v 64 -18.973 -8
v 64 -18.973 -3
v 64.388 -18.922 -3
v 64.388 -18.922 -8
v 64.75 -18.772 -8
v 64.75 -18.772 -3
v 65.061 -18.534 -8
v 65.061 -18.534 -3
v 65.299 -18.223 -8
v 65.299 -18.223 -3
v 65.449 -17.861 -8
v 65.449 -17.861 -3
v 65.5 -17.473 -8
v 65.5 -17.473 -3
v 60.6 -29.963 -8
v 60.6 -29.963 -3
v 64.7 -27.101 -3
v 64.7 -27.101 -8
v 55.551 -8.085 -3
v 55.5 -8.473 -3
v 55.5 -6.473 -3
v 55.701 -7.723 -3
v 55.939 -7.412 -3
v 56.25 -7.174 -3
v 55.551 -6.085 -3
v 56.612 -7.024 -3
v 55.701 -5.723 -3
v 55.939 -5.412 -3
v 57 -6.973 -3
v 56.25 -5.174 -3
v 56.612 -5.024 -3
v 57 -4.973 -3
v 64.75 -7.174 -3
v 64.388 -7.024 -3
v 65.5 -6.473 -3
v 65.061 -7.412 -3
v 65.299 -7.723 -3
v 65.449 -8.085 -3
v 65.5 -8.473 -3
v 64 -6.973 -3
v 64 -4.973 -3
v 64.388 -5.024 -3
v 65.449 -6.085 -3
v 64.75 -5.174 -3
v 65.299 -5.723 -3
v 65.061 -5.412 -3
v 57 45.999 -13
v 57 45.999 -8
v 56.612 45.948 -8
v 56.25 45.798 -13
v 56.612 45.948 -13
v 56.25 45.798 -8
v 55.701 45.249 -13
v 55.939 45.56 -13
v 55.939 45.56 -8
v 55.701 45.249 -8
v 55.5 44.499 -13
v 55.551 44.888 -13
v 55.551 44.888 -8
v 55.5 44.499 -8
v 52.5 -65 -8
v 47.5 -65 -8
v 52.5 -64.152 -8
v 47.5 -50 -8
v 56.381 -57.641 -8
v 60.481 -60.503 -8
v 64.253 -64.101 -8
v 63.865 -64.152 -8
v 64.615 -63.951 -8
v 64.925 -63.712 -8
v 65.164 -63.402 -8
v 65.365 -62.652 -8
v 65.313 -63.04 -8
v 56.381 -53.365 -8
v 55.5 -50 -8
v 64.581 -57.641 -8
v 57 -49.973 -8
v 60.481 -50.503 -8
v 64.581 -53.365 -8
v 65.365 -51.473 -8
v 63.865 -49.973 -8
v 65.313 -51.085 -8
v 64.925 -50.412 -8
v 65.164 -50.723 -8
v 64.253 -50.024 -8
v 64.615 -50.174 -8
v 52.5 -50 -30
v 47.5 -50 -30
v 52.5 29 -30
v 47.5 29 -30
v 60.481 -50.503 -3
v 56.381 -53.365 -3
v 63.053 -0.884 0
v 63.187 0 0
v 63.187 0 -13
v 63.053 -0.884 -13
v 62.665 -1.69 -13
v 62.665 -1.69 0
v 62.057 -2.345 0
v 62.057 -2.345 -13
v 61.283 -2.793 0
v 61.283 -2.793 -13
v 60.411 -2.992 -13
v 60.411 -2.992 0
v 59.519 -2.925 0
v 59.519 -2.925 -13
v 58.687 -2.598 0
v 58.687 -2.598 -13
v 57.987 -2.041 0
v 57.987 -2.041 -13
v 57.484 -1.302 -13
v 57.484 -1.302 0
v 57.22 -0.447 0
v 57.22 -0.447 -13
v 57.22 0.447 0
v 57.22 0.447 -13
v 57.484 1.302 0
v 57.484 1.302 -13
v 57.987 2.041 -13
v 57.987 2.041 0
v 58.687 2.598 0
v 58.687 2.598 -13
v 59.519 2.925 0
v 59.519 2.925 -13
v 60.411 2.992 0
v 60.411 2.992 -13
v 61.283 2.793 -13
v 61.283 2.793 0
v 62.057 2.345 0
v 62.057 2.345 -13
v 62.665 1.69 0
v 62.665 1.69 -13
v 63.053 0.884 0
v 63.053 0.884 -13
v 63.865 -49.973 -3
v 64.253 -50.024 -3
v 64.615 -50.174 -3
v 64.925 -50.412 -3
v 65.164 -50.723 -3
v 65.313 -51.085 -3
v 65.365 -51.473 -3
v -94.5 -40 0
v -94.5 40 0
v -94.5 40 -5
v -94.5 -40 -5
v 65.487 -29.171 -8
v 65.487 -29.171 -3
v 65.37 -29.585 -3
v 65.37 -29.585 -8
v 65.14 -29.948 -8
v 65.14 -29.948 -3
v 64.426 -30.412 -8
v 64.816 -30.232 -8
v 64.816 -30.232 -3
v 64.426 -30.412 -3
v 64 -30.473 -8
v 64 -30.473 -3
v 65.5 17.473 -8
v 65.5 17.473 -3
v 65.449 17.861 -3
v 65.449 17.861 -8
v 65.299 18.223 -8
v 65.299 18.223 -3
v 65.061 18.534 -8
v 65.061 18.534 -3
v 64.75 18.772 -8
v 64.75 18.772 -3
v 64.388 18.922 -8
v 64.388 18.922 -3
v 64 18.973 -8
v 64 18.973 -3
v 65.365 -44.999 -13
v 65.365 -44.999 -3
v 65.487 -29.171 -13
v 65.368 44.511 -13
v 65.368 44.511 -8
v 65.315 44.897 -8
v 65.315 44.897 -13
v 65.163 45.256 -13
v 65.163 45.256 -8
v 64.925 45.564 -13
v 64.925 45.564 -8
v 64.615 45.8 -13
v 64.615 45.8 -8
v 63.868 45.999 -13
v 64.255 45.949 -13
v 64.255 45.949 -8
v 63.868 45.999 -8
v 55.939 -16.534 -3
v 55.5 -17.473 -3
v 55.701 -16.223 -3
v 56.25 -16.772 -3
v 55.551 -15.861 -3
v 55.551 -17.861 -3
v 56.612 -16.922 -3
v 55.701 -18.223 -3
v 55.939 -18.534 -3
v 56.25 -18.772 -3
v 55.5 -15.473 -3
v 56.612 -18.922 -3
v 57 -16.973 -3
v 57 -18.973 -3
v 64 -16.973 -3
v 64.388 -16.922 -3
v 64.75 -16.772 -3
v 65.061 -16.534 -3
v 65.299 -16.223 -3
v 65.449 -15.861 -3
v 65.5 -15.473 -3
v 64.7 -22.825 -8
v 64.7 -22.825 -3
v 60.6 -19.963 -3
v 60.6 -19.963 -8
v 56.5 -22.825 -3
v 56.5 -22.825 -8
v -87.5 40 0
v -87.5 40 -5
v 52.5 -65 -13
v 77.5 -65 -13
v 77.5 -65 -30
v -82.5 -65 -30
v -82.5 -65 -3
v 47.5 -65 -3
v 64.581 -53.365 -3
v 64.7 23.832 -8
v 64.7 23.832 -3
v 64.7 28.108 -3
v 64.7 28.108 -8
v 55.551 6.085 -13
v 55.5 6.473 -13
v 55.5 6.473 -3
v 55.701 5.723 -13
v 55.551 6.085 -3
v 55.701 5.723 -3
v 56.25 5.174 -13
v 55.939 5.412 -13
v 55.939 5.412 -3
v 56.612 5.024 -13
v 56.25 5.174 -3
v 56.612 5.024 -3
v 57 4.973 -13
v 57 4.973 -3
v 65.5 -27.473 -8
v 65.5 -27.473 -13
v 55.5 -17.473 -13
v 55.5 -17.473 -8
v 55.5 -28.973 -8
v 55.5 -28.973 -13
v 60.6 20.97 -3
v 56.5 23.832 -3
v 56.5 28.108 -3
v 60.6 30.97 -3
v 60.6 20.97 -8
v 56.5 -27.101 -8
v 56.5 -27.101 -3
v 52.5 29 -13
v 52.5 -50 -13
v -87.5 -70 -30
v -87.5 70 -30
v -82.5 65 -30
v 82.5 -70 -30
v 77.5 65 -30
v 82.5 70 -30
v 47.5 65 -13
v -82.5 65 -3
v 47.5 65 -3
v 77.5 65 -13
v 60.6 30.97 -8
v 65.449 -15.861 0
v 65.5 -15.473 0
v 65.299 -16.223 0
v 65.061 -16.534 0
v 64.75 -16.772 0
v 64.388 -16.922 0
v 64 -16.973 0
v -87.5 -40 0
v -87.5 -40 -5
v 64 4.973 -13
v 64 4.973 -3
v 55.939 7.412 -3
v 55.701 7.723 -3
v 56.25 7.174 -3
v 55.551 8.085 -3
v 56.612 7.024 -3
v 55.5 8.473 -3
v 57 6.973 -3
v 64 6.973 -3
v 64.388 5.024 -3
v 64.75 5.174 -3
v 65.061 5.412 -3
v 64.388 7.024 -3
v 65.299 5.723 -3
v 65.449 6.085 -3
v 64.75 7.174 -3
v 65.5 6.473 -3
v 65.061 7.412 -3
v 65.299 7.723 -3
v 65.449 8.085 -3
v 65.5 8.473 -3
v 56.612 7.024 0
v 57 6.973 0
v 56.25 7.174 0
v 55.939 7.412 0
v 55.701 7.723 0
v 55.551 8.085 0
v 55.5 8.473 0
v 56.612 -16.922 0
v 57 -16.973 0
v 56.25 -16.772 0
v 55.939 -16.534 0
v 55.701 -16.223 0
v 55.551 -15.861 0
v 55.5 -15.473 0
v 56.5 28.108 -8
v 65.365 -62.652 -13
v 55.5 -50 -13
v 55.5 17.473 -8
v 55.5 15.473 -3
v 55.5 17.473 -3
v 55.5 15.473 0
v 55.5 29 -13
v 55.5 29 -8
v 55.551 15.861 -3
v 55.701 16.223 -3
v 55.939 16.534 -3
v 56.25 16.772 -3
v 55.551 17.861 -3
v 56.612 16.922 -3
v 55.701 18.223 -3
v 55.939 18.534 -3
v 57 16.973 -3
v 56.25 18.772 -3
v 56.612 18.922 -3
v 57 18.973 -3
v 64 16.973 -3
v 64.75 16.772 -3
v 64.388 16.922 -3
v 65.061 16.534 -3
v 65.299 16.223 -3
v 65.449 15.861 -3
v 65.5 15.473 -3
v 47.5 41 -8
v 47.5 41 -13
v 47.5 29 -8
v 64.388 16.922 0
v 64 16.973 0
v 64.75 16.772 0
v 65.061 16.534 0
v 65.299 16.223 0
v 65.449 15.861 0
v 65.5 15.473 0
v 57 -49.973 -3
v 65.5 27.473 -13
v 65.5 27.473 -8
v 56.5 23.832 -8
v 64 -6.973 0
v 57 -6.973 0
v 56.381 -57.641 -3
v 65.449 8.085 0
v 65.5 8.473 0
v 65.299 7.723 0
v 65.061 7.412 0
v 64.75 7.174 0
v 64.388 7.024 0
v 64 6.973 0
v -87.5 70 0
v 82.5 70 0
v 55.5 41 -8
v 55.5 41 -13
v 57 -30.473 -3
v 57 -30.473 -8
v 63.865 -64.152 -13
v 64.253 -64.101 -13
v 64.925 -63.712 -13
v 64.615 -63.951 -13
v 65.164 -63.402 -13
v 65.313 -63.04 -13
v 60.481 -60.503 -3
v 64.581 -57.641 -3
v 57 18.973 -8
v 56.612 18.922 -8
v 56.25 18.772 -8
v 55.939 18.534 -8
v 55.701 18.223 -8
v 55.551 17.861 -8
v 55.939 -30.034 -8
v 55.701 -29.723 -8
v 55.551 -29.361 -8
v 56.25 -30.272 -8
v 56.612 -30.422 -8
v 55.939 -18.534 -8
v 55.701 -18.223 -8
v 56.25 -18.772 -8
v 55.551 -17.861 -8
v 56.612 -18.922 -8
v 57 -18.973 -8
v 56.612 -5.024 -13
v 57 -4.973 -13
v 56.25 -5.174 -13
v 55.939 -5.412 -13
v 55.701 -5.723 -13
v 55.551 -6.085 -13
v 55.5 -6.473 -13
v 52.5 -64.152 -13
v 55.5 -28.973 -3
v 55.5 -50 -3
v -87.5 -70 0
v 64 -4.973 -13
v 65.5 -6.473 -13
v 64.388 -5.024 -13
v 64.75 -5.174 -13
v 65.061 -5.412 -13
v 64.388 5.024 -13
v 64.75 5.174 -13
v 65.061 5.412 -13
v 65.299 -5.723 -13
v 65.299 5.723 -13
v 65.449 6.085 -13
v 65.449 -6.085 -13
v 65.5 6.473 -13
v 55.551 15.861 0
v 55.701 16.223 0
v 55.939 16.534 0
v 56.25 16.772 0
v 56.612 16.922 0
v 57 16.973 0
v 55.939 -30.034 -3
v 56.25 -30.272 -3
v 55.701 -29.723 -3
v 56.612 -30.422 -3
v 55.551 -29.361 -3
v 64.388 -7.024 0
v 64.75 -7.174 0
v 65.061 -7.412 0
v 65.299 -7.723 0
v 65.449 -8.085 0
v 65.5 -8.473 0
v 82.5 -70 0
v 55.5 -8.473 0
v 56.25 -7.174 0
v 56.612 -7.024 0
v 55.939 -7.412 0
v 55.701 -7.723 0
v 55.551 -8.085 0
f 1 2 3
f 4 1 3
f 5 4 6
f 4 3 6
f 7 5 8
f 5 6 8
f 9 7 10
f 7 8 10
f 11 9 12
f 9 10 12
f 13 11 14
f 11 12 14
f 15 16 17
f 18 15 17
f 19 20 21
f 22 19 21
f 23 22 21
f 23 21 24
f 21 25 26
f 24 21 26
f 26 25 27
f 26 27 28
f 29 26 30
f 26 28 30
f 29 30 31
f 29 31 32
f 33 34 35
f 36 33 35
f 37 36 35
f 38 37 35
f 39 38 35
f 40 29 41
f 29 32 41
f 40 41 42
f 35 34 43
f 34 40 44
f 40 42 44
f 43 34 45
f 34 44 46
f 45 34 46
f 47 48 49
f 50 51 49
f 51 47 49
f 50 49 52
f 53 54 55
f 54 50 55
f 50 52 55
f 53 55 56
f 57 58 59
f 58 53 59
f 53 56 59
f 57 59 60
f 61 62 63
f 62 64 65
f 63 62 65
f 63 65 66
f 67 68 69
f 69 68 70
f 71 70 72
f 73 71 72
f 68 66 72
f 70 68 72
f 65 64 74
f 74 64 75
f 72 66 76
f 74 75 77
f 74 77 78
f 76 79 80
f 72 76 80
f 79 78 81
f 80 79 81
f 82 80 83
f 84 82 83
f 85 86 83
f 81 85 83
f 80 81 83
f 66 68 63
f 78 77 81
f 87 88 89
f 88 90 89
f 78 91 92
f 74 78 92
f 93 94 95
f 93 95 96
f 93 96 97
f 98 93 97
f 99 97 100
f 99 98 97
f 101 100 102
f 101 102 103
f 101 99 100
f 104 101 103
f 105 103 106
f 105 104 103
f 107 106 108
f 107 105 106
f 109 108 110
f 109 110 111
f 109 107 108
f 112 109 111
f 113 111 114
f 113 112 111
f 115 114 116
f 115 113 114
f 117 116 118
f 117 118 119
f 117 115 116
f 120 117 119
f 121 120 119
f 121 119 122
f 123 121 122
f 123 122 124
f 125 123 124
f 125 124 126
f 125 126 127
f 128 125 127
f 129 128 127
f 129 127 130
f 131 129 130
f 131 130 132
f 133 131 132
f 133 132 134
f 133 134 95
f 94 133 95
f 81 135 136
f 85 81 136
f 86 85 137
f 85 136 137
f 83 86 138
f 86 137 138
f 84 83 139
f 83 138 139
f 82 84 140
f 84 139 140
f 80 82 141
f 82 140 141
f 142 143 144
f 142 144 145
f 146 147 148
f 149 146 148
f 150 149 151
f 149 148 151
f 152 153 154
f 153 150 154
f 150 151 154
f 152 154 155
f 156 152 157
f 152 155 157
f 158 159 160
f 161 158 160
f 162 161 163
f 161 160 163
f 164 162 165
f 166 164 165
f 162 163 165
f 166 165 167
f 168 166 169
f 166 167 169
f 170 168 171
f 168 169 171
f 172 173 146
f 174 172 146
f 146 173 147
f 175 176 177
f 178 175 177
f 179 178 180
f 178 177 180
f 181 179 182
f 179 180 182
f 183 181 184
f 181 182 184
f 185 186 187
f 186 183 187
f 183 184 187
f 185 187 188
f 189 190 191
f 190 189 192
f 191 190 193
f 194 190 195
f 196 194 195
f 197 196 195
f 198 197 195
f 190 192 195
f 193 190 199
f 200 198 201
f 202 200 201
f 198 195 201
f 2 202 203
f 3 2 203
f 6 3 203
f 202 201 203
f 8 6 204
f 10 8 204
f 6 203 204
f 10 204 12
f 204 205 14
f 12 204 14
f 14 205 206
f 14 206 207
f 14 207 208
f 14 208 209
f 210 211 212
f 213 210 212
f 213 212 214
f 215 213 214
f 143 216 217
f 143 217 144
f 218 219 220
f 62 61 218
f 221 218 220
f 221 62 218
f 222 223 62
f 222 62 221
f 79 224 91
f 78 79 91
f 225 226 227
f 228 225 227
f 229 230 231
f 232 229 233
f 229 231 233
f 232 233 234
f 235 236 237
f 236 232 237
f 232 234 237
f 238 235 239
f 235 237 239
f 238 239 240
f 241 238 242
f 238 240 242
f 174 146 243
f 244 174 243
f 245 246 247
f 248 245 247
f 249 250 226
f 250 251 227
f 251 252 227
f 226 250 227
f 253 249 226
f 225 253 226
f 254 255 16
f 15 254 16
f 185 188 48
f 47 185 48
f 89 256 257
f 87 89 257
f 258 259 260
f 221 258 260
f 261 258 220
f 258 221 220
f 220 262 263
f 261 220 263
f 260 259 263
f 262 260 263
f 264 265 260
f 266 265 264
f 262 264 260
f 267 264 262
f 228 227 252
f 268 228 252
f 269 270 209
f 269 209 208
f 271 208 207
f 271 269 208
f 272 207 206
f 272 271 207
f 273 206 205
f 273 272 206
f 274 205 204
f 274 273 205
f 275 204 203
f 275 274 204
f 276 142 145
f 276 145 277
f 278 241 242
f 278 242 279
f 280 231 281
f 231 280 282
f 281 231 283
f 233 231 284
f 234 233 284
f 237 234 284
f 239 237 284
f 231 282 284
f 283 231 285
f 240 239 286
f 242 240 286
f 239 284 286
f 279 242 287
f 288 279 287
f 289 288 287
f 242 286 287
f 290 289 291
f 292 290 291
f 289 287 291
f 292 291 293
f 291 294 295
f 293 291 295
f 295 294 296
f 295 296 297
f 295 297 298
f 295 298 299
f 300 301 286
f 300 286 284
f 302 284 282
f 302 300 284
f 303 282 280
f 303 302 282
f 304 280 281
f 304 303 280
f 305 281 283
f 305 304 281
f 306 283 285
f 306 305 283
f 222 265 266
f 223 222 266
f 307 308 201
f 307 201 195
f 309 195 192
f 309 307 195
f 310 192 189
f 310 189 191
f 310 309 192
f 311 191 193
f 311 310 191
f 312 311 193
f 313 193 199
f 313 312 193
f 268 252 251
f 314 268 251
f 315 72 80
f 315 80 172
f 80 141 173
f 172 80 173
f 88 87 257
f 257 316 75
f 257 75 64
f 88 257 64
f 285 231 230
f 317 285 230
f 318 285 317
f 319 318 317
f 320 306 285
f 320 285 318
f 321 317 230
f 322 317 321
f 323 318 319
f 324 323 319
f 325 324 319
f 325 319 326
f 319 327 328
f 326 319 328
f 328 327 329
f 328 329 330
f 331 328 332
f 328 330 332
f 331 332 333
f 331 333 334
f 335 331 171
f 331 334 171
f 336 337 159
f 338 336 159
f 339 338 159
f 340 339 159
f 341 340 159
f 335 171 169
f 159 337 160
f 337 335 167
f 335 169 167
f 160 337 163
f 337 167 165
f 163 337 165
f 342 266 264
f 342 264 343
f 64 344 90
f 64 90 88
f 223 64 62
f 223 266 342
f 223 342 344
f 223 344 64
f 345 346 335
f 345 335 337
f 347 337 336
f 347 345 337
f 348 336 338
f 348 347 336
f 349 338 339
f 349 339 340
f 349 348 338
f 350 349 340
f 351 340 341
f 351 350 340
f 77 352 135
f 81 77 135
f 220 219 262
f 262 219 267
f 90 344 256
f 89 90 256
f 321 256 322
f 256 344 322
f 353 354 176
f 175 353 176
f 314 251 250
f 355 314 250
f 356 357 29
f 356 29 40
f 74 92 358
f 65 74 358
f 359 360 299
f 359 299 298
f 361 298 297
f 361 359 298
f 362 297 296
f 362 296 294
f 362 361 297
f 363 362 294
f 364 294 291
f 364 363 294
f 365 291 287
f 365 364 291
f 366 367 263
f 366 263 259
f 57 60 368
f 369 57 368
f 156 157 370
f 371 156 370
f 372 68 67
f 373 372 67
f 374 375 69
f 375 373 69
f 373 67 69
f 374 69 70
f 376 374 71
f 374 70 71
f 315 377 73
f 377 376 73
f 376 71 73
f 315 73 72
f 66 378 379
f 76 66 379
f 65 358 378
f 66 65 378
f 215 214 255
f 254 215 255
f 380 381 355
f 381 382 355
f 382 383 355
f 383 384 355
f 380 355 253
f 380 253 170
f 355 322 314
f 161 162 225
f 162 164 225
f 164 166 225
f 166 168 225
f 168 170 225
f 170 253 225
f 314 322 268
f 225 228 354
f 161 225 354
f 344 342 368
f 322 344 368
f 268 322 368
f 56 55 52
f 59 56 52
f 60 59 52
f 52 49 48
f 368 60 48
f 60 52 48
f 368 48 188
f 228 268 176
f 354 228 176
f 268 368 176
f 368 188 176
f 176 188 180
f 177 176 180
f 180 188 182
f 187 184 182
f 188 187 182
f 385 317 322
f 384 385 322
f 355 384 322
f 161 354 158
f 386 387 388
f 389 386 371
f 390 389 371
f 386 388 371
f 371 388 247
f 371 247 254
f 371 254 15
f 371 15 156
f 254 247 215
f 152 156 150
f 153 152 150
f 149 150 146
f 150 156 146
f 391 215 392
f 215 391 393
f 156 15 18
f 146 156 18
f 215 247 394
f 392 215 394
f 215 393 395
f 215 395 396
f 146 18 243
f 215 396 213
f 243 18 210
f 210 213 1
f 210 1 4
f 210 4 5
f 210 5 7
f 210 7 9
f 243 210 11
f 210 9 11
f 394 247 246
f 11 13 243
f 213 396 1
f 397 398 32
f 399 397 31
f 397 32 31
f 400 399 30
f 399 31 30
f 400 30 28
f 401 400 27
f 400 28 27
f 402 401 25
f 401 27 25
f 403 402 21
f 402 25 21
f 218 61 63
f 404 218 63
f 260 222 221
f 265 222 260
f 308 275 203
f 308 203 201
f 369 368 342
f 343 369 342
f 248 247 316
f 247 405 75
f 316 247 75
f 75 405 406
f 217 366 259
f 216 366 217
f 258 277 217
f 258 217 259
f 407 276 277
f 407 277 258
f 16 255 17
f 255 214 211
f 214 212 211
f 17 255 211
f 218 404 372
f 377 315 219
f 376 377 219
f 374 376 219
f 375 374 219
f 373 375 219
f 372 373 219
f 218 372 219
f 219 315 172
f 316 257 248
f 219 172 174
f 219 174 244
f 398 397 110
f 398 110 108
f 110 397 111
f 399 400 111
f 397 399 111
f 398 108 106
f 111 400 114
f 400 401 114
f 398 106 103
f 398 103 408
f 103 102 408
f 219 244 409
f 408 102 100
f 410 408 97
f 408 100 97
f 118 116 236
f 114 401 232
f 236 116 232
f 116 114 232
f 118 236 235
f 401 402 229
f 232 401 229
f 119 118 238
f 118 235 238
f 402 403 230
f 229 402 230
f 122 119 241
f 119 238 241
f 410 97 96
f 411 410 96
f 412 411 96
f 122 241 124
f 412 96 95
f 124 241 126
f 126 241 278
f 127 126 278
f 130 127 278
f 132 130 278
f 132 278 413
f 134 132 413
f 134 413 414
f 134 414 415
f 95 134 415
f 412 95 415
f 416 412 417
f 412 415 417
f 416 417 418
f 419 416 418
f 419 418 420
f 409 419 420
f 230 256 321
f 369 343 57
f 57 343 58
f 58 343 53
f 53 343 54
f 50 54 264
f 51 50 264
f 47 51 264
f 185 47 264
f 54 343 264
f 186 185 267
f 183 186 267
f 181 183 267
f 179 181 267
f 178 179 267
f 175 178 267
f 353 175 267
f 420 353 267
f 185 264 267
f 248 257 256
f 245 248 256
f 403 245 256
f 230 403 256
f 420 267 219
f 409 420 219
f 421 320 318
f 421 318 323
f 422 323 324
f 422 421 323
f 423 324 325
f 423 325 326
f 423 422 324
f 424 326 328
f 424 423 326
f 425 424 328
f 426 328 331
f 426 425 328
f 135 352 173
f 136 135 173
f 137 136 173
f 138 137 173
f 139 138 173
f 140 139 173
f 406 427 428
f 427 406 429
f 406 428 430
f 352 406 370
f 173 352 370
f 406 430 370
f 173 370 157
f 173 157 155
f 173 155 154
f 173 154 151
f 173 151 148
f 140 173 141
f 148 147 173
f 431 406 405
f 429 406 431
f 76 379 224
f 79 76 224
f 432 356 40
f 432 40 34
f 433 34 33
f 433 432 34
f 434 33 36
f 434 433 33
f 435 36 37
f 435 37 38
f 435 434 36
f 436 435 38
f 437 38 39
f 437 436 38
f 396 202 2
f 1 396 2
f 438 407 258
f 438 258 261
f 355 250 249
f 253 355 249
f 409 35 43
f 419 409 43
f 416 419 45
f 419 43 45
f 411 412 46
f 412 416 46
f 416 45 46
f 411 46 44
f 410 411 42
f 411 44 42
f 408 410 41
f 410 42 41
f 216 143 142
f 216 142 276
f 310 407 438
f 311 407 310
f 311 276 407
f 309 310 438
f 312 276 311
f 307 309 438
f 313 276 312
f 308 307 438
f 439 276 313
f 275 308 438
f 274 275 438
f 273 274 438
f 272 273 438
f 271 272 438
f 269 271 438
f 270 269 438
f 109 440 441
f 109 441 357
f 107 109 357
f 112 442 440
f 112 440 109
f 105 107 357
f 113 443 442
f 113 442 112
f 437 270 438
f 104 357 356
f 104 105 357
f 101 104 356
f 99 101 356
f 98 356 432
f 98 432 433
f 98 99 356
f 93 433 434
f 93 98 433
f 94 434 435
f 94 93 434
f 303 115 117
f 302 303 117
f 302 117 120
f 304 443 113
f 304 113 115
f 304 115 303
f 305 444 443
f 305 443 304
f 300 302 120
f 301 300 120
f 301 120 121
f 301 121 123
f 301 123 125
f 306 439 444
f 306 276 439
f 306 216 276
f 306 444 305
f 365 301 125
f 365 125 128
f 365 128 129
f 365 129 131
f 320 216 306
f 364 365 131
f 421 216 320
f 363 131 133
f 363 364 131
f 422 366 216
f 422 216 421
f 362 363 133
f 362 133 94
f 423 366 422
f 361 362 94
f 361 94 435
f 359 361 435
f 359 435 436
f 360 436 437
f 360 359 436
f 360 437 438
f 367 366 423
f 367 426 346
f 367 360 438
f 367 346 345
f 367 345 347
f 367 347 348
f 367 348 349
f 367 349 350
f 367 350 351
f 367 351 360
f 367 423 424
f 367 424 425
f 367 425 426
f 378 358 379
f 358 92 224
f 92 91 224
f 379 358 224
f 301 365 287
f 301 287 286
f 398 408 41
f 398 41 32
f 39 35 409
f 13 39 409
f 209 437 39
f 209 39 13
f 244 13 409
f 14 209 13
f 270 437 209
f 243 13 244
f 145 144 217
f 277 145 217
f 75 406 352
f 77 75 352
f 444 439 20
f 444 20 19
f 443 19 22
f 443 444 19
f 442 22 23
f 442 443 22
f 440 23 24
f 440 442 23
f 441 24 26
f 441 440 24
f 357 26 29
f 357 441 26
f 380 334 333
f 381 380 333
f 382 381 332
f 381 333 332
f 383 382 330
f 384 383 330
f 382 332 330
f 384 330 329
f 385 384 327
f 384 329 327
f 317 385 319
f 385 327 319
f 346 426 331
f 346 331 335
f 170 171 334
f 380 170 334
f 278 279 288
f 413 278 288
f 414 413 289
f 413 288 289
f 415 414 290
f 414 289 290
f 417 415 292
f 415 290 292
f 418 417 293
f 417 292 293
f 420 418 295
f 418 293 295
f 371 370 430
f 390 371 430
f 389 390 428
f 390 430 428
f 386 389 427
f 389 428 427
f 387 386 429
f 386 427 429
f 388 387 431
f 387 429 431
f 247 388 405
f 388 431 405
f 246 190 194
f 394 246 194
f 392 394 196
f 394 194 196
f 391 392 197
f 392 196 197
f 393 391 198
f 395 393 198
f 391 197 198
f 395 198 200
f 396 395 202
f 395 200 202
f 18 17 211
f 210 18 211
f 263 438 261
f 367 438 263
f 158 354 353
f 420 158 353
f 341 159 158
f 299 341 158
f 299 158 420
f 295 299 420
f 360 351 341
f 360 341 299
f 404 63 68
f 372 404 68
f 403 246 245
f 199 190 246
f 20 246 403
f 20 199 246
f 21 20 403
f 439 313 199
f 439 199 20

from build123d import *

# Parameters (mm, degrees)
F0_W     = 5
F0_H     = 24
F0_H_2   = 12
F0_R     = 2.55
F0_W_2   = 3
F1_DEPTH = 30
F2_START = -13
F2_DEPTH = 17
F3_START = -3
F3_DEPTH = 27
F4_START = -8
F4_DEPTH = 22
F5_DEPTH = 3
F6_DEPTH = 5


# Not quite as in the source:
# - a feature names something its author has since deleted; it is built from what else it names


with BuildPart() as f1:
    # F0 (on Top) → F1 (new body)
    with BuildSketch(Plane.XY):
        Polygon((82.5, 70), (-87.5, 70), (-87.5, 65), (-87.5, 40), (-87.5, 5), (-87.5, -5), (-87.5, -40), (-87.5, -65), (-87.5, -70), (-82.5, -70), (82.5, -70), (82.5, 0), align=None)
        Polygon((47.5, -65), (-82.5, -65), (-82.5, 65), (47.5, 65), (52.5, 65), (77.5, 65), (77.5, 0), (77.5, -65), (52.5, -65), align=None, mode=Mode.SUBTRACT)
        with BuildLine():
            Line((77.5, 65), (52.5, 65))
            Line((52.5, 65), (52.5, 41))
            Line((52.5, 41), (55.5, 41))
            Line((55.5, 41), (55.5, 44.499418828))
            ThreePointArc((55.5, 44.499418828), (55.9393398282, 45.5600789998), (57, 45.999418828))
            Line((57, 45.999418828), (63.8683293534, 45.999418828))
            ThreePointArc((63.8683293534, 45.999418828), (64.9248818439, 45.5641708343), (65.3682845321, 44.5110146078))
            Line((65.3682845321, 44.5110146078), (65.5, 27.4731523439))
            Line((65.5, 27.4731523439), (65.5, 18.9731523439))
            Line((65.5, 18.9731523439), (65.5, 17.4731523439))
            Line((65.5, 17.4731523439), (65.5, 16.9731523439))
            Line((65.5, 16.9731523439), (65.5, 15.4731523439))
            Line((65.5, 15.4731523439), (65.5, 8.4731523439))
            Line((65.5, 8.4731523439), (65.5, 6.9731523439))
            Line((65.5, 6.9731523439), (65.5, 6.4731523439))
            ThreePointArc((65.5, 6.4731523439), (65.0606601718, 5.4124921721), (64, 4.9731523439))
            Line((64, 4.9731523439), (57, 4.9731523439))
            ThreePointArc((57, 4.9731523439), (55.9393398282, 5.4124921721), (55.5, 6.4731523439))
            Line((55.5, 6.4731523439), (55.5, 6.9731523439))
            Line((55.5, 6.9731523439), (55.5, 8.4731523439))
            Line((55.5, 8.4731523439), (55.5, 15.4731523439))
            Line((55.5, 15.4731523439), (55.5, 16.9731523439))
            Line((55.5, 16.9731523439), (55.5, 17.4731523439))
            Line((55.5, 17.4731523439), (55.5, 18.9731523439))
            Line((55.5, 18.9731523439), (55.5, 27.4731523439))
            Line((55.5, 27.4731523439), (55.5, 29))
            Line((55.5, 29), (52.5, 29))
            Line((52.5, 29), (52.5, 0))
            Line((52.5, 0), (57.1866021752, 0))
            ThreePointArc((57.1866021752, 0), (60.1866021752, 3), (63.1866021752, 0))
            Line((63.1866021752, 0), (77.5, 0))
            Line((77.5, 0), (77.5, 65))
        make_face()
        with BuildLine():
            Line((52.5, -64.151630939), (52.5, -65))
            Line((52.5, -65), (77.5, -65))
            Line((77.5, -65), (77.5, 0))
            Line((77.5, 0), (63.1866021752, 0))
            ThreePointArc((63.1866021752, 0), (60.1866021752, -3), (57.1866021752, 0))
            Line((57.1866021752, 0), (52.5, 0))
            Line((52.5, 0), (52.5, -50))
            Line((52.5, -50), (55.5, -50))
            Line((55.5, -50), (55.5, -45))
            Line((55.5, -45), (55.5, -28.9731503129))
            Line((55.5, -28.9731503129), (55.5, -27.4731523439))
            Line((55.5, -27.4731523439), (55.5, -17.4731523439))
            Line((55.5, -17.4731523439), (55.5, -15.4731523439))
            Line((55.5, -15.4731523439), (55.5, -8.4731523439))
            Line((55.5, -8.4731523439), (55.5, -6.4731523439))
            ThreePointArc((55.5, -6.4731523439), (55.9393398282, -5.4124921721), (57, -4.9731523439))
            Line((57, -4.9731523439), (64, -4.9731523439))
            ThreePointArc((64, -4.9731523439), (65.0606601718, -5.4124921721), (65.5, -6.4731523439))
            Line((65.5, -6.4731523439), (65.5, -8.4731523439))
            Line((65.5, -8.4731523439), (65.5, -15.4731523439))
            Line((65.5, -15.4731523439), (65.5, -17.4731523439))
            Line((65.5, -17.4731523439), (65.5, -27.4731523439))
            Line((65.5, -27.4731523439), (65.4868731143, -29.171161501))
            Line((65.4868731143, -29.171161501), (65.3645118363, -44.9990261692))
            Line((65.3645118363, -44.9990261692), (65.3645118363, -51.4731504917))
            Line((65.3645118363, -51.4731504917), (65.3645118363, -58.4731504917))
            Line((65.3645118363, -58.4731504917), (65.3645118363, -62.651630939))
            ThreePointArc((65.3645118363, -62.651630939), (64.9251720081, -63.7122911108), (63.8645118363, -64.151630939))
            Line((63.8645118363, -64.151630939), (55.5, -64.151630939))
            Line((55.5, -64.151630939), (52.5, -64.151630939))
        make_face()
        Polygon((47.5, -0.9090909091), (47.5, -50), (52.5, -50), (52.5, 0), (52.5, 29), (47.5, 29), (47.5, 0.9090909091), align=None)
        with BuildLine():
            Line((55.5, 44.499418828), (55.5, 41))
            Line((55.5, 41), (55.5, 29))
            Line((55.5, 29), (55.5, 27.4731523439))
            Line((55.5, 27.4731523439), (55.5, 18.9731523439))
            Line((55.5, 18.9731523439), (57, 18.9731523439))
            Line((57, 18.9731523439), (64, 18.9731523439))
            Line((64, 18.9731523439), (65.5, 18.9731523439))
            Line((65.5, 18.9731523439), (65.5, 27.4731523439))
            Line((65.5, 27.4731523439), (65.3682845321, 44.5110146078))
            ThreePointArc((65.3682845321, 44.5110146078), (64.9248818439, 45.5641708343), (63.8683293534, 45.999418828))
            Line((63.8683293534, 45.999418828), (57, 45.999418828))
            ThreePointArc((57, 45.999418828), (55.9393398282, 45.5600789998), (55.5, 44.499418828))
        make_face()
        Polygon((60.6, 20.97), (56.5, 23.8318176043), (56.5, 28.1081823957), (60.6, 30.97), (64.7, 28.1081823957), (64.7, 23.8318176043), align=None, mode=Mode.SUBTRACT)
        with BuildLine():
            Line((55.5, -45), (55.5, -50))
            Line((55.5, -50), (57, -49.9731504917))
            Line((57, -49.9731504917), (63.8645118363, -49.9731504917))
            ThreePointArc((63.8645118363, -49.9731504917), (64.9251720081, -50.4124903199), (65.3645118363, -51.4731504917))
            Line((65.3645118363, -51.4731504917), (65.3645118363, -44.9990261692))
            Line((65.3645118363, -44.9990261692), (65.4868731143, -29.171161501))
            ThreePointArc((65.4868731143, -29.171161501), (64.9881759296, -30.1016486032), (64.0000000298, -30.4731503129))
            Line((64.0000000298, -30.4731503129), (57.0000000298, -30.4731503129))
            ThreePointArc((57.0000000298, -30.4731503129), (55.939339858, -30.0338104847), (55.5000000298, -28.9731503129))
            Line((55.5, -28.9731503129), (55.5, -45))
        make_face()
        with BuildLine():
            Line((55.5, -58.4731504917), (55.5, -64.151630939))
            Line((55.5, -64.151630939), (63.8645118363, -64.151630939))
            ThreePointArc((63.8645118363, -64.151630939), (64.9251720081, -63.7122911108), (65.3645118363, -62.651630939))
            Line((65.3645118363, -62.651630939), (65.3645118363, -58.4731504917))
            Line((65.3645118363, -58.4731504917), (65.3645118363, -51.4731504917))
            ThreePointArc((65.3645118363, -51.4731504917), (64.9251720081, -50.4124903199), (63.8645118363, -49.9731504917))
            Line((63.8645118363, -49.9731504917), (57, -49.9731504917))
            Line((57, -49.9731504917), (55.5, -50))
            Line((55.5, -50), (55.5, -51.4731504917))
            Line((55.5, -51.4731504917), (55.5, -58.4731504917))
        make_face()
        Polygon((60.4814975321, -60.5032157659), (56.3814975321, -57.6413981616), (56.3814975321, -53.3650333702), (60.4814975321, -50.5032157659), (64.5814975321, -53.3650333702), (64.5814975321, -57.6413981616), align=None, mode=Mode.SUBTRACT)
        with Locations((50, 53)):
            Rectangle(F0_W, F0_H)
        with BuildLine():
            Line((55.5, -27.4731523439), (55.5, -28.9731503129))
            ThreePointArc((55.5000000298, -28.9731503129), (55.939339858, -30.0338104847), (57.0000000298, -30.4731503129))
            Line((57.0000000298, -30.4731503129), (64.0000000298, -30.4731503129))
            ThreePointArc((64.0000000298, -30.4731503129), (64.9881759296, -30.1016486032), (65.4868731143, -29.171161501))
            Line((65.4868731143, -29.171161501), (65.5, -27.4731523439))
            Line((65.5, -27.4731523439), (65.5, -17.4731523439))
            ThreePointArc((65.5, -17.4731523439), (65.0606601718, -18.5338125156), (64, -18.9731523439))
            Line((64, -18.9731523439), (57, -18.9731523439))
            ThreePointArc((57, -18.9731523439), (55.9393398282, -18.5338125156), (55.5, -17.4731523439))
            Line((55.5, -17.4731523439), (55.5, -27.4731523439))
        make_face()
        Polygon((60.6000007153, -29.9631433734), (56.5000007153, -27.1013257692), (56.5000007153, -22.8249609777), (60.6000007153, -19.9631433734), (64.7000007153, -22.8249609777), (64.7000007153, -27.1013257692), align=None, mode=Mode.SUBTRACT)
        Polygon((47.5, -50), (47.5, -65), (52.5, -65), (52.5, -64.151630939), (52.5, -50), align=None)
        with Locations((50, 35)):
            Rectangle(F0_W, F0_H_2)
        Polygon((56.5, 28.1081823957), (56.5, 23.8318176043), (60.6, 20.97), (64.7, 23.8318176043), (64.7, 28.1081823957), (60.6, 30.97), align=None)
        with Locations((60.6, 25.9731523439)):
            Circle(F0_R, mode=Mode.SUBTRACT)
        Polygon((56.3814975321, -53.3650333702), (56.3814975321, -57.6413981616), (60.4814975321, -60.5032157659), (64.5814975321, -57.6413981616), (64.5814975321, -53.3650333702), (60.4814975321, -50.5032157659), align=None)
        with Locations((60.4823811061, -55.5000021935)):
            Circle(F0_R, mode=Mode.SUBTRACT)
        Polygon((56.5000007153, -22.8249609777), (56.5000007153, -27.1013257692), (60.6000007153, -29.9631433734), (64.7000007153, -27.1013257692), (64.7000007153, -22.8249609777), (60.6000007153, -19.9631433734), align=None)
        with Locations((60.6000007153, -24.9631504917)):
            Circle(F0_R, mode=Mode.SUBTRACT)
        Polygon((52.5, -50), (52.5, -64.151630939), (55.5, -64.151630939), (55.5, -58.4731504917), (55.5, -51.4731504917), (55.5, -50), align=None)
        with Locations((54, 35)):
            Rectangle(F0_W_2, F0_H_2)
        with Locations((60.6000007153, -24.9631504917)):
            Circle(F0_R)
        with Locations((60.4823811061, -55.5000021935)):
            Circle(F0_R)
        with Locations((60.6, 25.9731523439)):
            Circle(F0_R)
        with BuildLine():
            Line((55.5, -6.4731523439), (55.5, -8.4731523439))
            ThreePointArc((55.5, -8.4731523439), (55.9393398282, -7.4124921721), (57, -6.9731523439))
            Line((57, -6.9731523439), (64, -6.9731523439))
            ThreePointArc((64, -6.9731523439), (65.0606601718, -7.4124921721), (65.5, -8.4731523439))
            Line((65.5, -8.4731523439), (65.5, -6.4731523439))
            ThreePointArc((65.5, -6.4731523439), (65.0606601718, -5.4124921721), (64, -4.9731523439))
            Line((64, -4.9731523439), (57, -4.9731523439))
            ThreePointArc((57, -4.9731523439), (55.9393398282, -5.4124921721), (55.5, -6.4731523439))
        make_face()
        with BuildLine():
            Line((55.5, -15.4731523439), (55.5, -17.4731523439))
            ThreePointArc((55.5, -17.4731523439), (55.9393398282, -18.5338125156), (57, -18.9731523439))
            Line((57, -18.9731523439), (64, -18.9731523439))
            ThreePointArc((64, -18.9731523439), (65.0606601718, -18.5338125156), (65.5, -17.4731523439))
            Line((65.5, -17.4731523439), (65.5, -15.4731523439))
            ThreePointArc((65.5, -15.4731523439), (65.0606601718, -16.5338125156), (64, -16.9731523439))
            Line((64, -16.9731523439), (57, -16.9731523439))
            ThreePointArc((57, -16.9731523439), (55.9393398282, -16.5338125156), (55.5, -15.4731523439))
        make_face()
        with BuildLine():
            Line((64, 18.9731523439), (57, 18.9731523439))
            ThreePointArc((57, 18.9731523439), (55.9393398282, 18.5338125156), (55.5, 17.4731523439))
            Line((55.5, 17.4731523439), (55.5, 16.9731523439))
            Line((55.5, 16.9731523439), (57, 16.9731523439))
            Line((57, 16.9731523439), (64, 16.9731523439))
            Line((64, 16.9731523439), (65.5, 16.9731523439))
            Line((65.5, 16.9731523439), (65.5, 17.4731523439))
            ThreePointArc((65.5, 17.4731523439), (65.0606601718, 18.5338125156), (64, 18.9731523439))
        make_face()
        with BuildLine():
            Line((57, 6.9731523439), (55.5, 6.9731523439))
            Line((55.5, 6.9731523439), (55.5, 6.4731523439))
            ThreePointArc((55.5, 6.4731523439), (55.9393398282, 5.4124921721), (57, 4.9731523439))
            Line((57, 4.9731523439), (64, 4.9731523439))
            ThreePointArc((64, 4.9731523439), (65.0606601718, 5.4124921721), (65.5, 6.4731523439))
            Line((65.5, 6.4731523439), (65.5, 6.9731523439))
            Line((65.5, 6.9731523439), (64, 6.9731523439))
            Line((64, 6.9731523439), (57, 6.9731523439))
        make_face()
        with BuildLine():
            Line((65.5, 18.9731523439), (64, 18.9731523439))
            ThreePointArc((64, 18.9731523439), (65.0606601718, 18.5338125156), (65.5, 17.4731523439))
            Line((65.5, 17.4731523439), (65.5, 18.9731523439))
        make_face()
        with BuildLine():
            Line((57, 18.9731523439), (55.5, 18.9731523439))
            Line((55.5, 18.9731523439), (55.5, 17.4731523439))
            ThreePointArc((55.5, 17.4731523439), (55.9393398282, 18.5338125156), (57, 18.9731523439))
        make_face()
        with BuildLine():
            Line((57, 16.9731523439), (55.5, 16.9731523439))
            Line((55.5, 16.9731523439), (55.5, 15.4731523439))
            ThreePointArc((55.5, 15.4731523439), (55.9393398282, 16.5338125156), (57, 16.9731523439))
        make_face()
        with BuildLine():
            Line((65.5, 15.4731523439), (65.5, 16.9731523439))
            Line((65.5, 16.9731523439), (64, 16.9731523439))
            ThreePointArc((64, 16.9731523439), (65.0606601718, 16.5338125156), (65.5, 15.4731523439))
        make_face()
        with BuildLine():
            Line((65.5, 6.9731523439), (65.5, 8.4731523439))
            ThreePointArc((65.5, 8.4731523439), (65.0606601718, 7.4124921721), (64, 6.9731523439))
            Line((64, 6.9731523439), (65.5, 6.9731523439))
        make_face()
        with BuildLine():
            ThreePointArc((57, 6.9731523439), (55.9393398282, 7.4124921721), (55.5, 8.4731523439))
            Line((55.5, 8.4731523439), (55.5, 6.9731523439))
            Line((55.5, 6.9731523439), (57, 6.9731523439))
        make_face()
    extrude(amount=-F1_DEPTH)

    # F0 (on Top) → F2 (cut)
    with BuildSketch(Plane.XY.offset(F2_START)):
        with BuildLine():
            Line((77.5, 65), (52.5, 65))
            Line((52.5, 65), (52.5, 41))
            Line((52.5, 41), (55.5, 41))
            Line((55.5, 41), (55.5, 44.499418828))
            ThreePointArc((55.5, 44.499418828), (55.9393398282, 45.5600789998), (57, 45.999418828))
            Line((57, 45.999418828), (63.8683293534, 45.999418828))
            ThreePointArc((63.8683293534, 45.999418828), (64.9248818439, 45.5641708343), (65.3682845321, 44.5110146078))
            Line((65.3682845321, 44.5110146078), (65.5, 27.4731523439))
            Line((65.5, 27.4731523439), (65.5, 18.9731523439))
            Line((65.5, 18.9731523439), (65.5, 17.4731523439))
            Line((65.5, 17.4731523439), (65.5, 16.9731523439))
            Line((65.5, 16.9731523439), (65.5, 15.4731523439))
            Line((65.5, 15.4731523439), (65.5, 8.4731523439))
            Line((65.5, 8.4731523439), (65.5, 6.9731523439))
            Line((65.5, 6.9731523439), (65.5, 6.4731523439))
            ThreePointArc((65.5, 6.4731523439), (65.0606601718, 5.4124921721), (64, 4.9731523439))
            Line((64, 4.9731523439), (57, 4.9731523439))
            ThreePointArc((57, 4.9731523439), (55.9393398282, 5.4124921721), (55.5, 6.4731523439))
            Line((55.5, 6.4731523439), (55.5, 6.9731523439))
            Line((55.5, 6.9731523439), (55.5, 8.4731523439))
            Line((55.5, 8.4731523439), (55.5, 15.4731523439))
            Line((55.5, 15.4731523439), (55.5, 16.9731523439))
            Line((55.5, 16.9731523439), (55.5, 17.4731523439))
            Line((55.5, 17.4731523439), (55.5, 18.9731523439))
            Line((55.5, 18.9731523439), (55.5, 27.4731523439))
            Line((55.5, 27.4731523439), (55.5, 29))
            Line((55.5, 29), (52.5, 29))
            Line((52.5, 29), (52.5, 0))
            Line((52.5, 0), (57.1866021752, 0))
            ThreePointArc((57.1866021752, 0), (60.1866021752, 3), (63.1866021752, 0))
            Line((63.1866021752, 0), (77.5, 0))
            Line((77.5, 0), (77.5, 65))
        make_face()
        with BuildLine():
            Line((52.5, -64.151630939), (52.5, -65))
            Line((52.5, -65), (77.5, -65))
            Line((77.5, -65), (77.5, 0))
            Line((77.5, 0), (63.1866021752, 0))
            ThreePointArc((63.1866021752, 0), (60.1866021752, -3), (57.1866021752, 0))
            Line((57.1866021752, 0), (52.5, 0))
            Line((52.5, 0), (52.5, -50))
            Line((52.5, -50), (55.5, -50))
            Line((55.5, -50), (55.5, -45))
            Line((55.5, -45), (55.5, -28.9731503129))
            Line((55.5, -28.9731503129), (55.5, -27.4731523439))
            Line((55.5, -27.4731523439), (55.5, -17.4731523439))
            Line((55.5, -17.4731523439), (55.5, -15.4731523439))
            Line((55.5, -15.4731523439), (55.5, -8.4731523439))
            Line((55.5, -8.4731523439), (55.5, -6.4731523439))
            ThreePointArc((55.5, -6.4731523439), (55.9393398282, -5.4124921721), (57, -4.9731523439))
            Line((57, -4.9731523439), (64, -4.9731523439))
            ThreePointArc((64, -4.9731523439), (65.0606601718, -5.4124921721), (65.5, -6.4731523439))
            Line((65.5, -6.4731523439), (65.5, -8.4731523439))
            Line((65.5, -8.4731523439), (65.5, -15.4731523439))
            Line((65.5, -15.4731523439), (65.5, -17.4731523439))
            Line((65.5, -17.4731523439), (65.5, -27.4731523439))
            Line((65.5, -27.4731523439), (65.4868731143, -29.171161501))
            Line((65.4868731143, -29.171161501), (65.3645118363, -44.9990261692))
            Line((65.3645118363, -44.9990261692), (65.3645118363, -51.4731504917))
            Line((65.3645118363, -51.4731504917), (65.3645118363, -58.4731504917))
            Line((65.3645118363, -58.4731504917), (65.3645118363, -62.651630939))
            ThreePointArc((65.3645118363, -62.651630939), (64.9251720081, -63.7122911108), (63.8645118363, -64.151630939))
            Line((63.8645118363, -64.151630939), (55.5, -64.151630939))
            Line((55.5, -64.151630939), (52.5, -64.151630939))
        make_face()
        with Locations((50, 53)):
            Rectangle(F0_W, F0_H)
    extrude(amount=-F2_DEPTH, mode=Mode.SUBTRACT)

    # F0 (on Top) → F3 (cut)
    with BuildSketch(Plane.XY.offset(F3_START)):
        with BuildLine():
            Line((64, 18.9731523439), (57, 18.9731523439))
            ThreePointArc((57, 18.9731523439), (55.9393398282, 18.5338125156), (55.5, 17.4731523439))
            Line((55.5, 17.4731523439), (55.5, 16.9731523439))
            Line((55.5, 16.9731523439), (57, 16.9731523439))
            Line((57, 16.9731523439), (64, 16.9731523439))
            Line((64, 16.9731523439), (65.5, 16.9731523439))
            Line((65.5, 16.9731523439), (65.5, 17.4731523439))
            ThreePointArc((65.5, 17.4731523439), (65.0606601718, 18.5338125156), (64, 18.9731523439))
        make_face()
        with BuildLine():
            Line((57, 6.9731523439), (55.5, 6.9731523439))
            Line((55.5, 6.9731523439), (55.5, 6.4731523439))
            ThreePointArc((55.5, 6.4731523439), (55.9393398282, 5.4124921721), (57, 4.9731523439))
            Line((57, 4.9731523439), (64, 4.9731523439))
            ThreePointArc((64, 4.9731523439), (65.0606601718, 5.4124921721), (65.5, 6.4731523439))
            Line((65.5, 6.4731523439), (65.5, 6.9731523439))
            Line((65.5, 6.9731523439), (64, 6.9731523439))
            Line((64, 6.9731523439), (57, 6.9731523439))
        make_face()
        with BuildLine():
            Line((57, 16.9731523439), (55.5, 16.9731523439))
            Line((55.5, 16.9731523439), (55.5, 15.4731523439))
            ThreePointArc((55.5, 15.4731523439), (55.9393398282, 16.5338125156), (57, 16.9731523439))
        make_face()
        with BuildLine():
            Line((65.5, 15.4731523439), (65.5, 16.9731523439))
            Line((65.5, 16.9731523439), (64, 16.9731523439))
            ThreePointArc((64, 16.9731523439), (65.0606601718, 16.5338125156), (65.5, 15.4731523439))
        make_face()
        with BuildLine():
            Line((65.5, 6.9731523439), (65.5, 8.4731523439))
            ThreePointArc((65.5, 8.4731523439), (65.0606601718, 7.4124921721), (64, 6.9731523439))
            Line((64, 6.9731523439), (65.5, 6.9731523439))
        make_face()
        with BuildLine():
            ThreePointArc((57, 6.9731523439), (55.9393398282, 7.4124921721), (55.5, 8.4731523439))
            Line((55.5, 8.4731523439), (55.5, 6.9731523439))
            Line((55.5, 6.9731523439), (57, 6.9731523439))
        make_face()
        with BuildLine():
            Line((55.5, -6.4731523439), (55.5, -8.4731523439))
            ThreePointArc((55.5, -8.4731523439), (55.9393398282, -7.4124921721), (57, -6.9731523439))
            Line((57, -6.9731523439), (64, -6.9731523439))
            ThreePointArc((64, -6.9731523439), (65.0606601718, -7.4124921721), (65.5, -8.4731523439))
            Line((65.5, -8.4731523439), (65.5, -6.4731523439))
            ThreePointArc((65.5, -6.4731523439), (65.0606601718, -5.4124921721), (64, -4.9731523439))
            Line((64, -4.9731523439), (57, -4.9731523439))
            ThreePointArc((57, -4.9731523439), (55.9393398282, -5.4124921721), (55.5, -6.4731523439))
        make_face()
        with BuildLine():
            Line((55.5, -15.4731523439), (55.5, -17.4731523439))
            ThreePointArc((55.5, -17.4731523439), (55.9393398282, -18.5338125156), (57, -18.9731523439))
            Line((57, -18.9731523439), (64, -18.9731523439))
            ThreePointArc((64, -18.9731523439), (65.0606601718, -18.5338125156), (65.5, -17.4731523439))
            Line((65.5, -17.4731523439), (65.5, -15.4731523439))
            ThreePointArc((65.5, -15.4731523439), (65.0606601718, -16.5338125156), (64, -16.9731523439))
            Line((64, -16.9731523439), (57, -16.9731523439))
            ThreePointArc((57, -16.9731523439), (55.9393398282, -16.5338125156), (55.5, -15.4731523439))
        make_face()
        Polygon((56.3814975321, -53.3650333702), (56.3814975321, -57.6413981616), (60.4814975321, -60.5032157659), (64.5814975321, -57.6413981616), (64.5814975321, -53.3650333702), (60.4814975321, -50.5032157659), align=None)
        with Locations((60.4823811061, -55.5000021935)):
            Circle(F0_R, mode=Mode.SUBTRACT)
        Polygon((56.5000007153, -22.8249609777), (56.5000007153, -27.1013257692), (60.6000007153, -29.9631433734), (64.7000007153, -27.1013257692), (64.7000007153, -22.8249609777), (60.6000007153, -19.9631433734), align=None)
        with Locations((60.6000007153, -24.9631504917)):
            Circle(F0_R, mode=Mode.SUBTRACT)
        with Locations((60.6000007153, -24.9631504917)):
            Circle(F0_R)
        with Locations((60.4823811061, -55.5000021935)):
            Circle(F0_R)
        with BuildLine():
            Line((55.5, -45), (55.5, -50))
            Line((55.5, -50), (57, -49.9731504917))
            Line((57, -49.9731504917), (63.8645118363, -49.9731504917))
            ThreePointArc((63.8645118363, -49.9731504917), (64.9251720081, -50.4124903199), (65.3645118363, -51.4731504917))
            Line((65.3645118363, -51.4731504917), (65.3645118363, -44.9990261692))
            Line((65.3645118363, -44.9990261692), (65.4868731143, -29.171161501))
            ThreePointArc((65.4868731143, -29.171161501), (64.9881759296, -30.1016486032), (64.0000000298, -30.4731503129))
            Line((64.0000000298, -30.4731503129), (57.0000000298, -30.4731503129))
            ThreePointArc((57.0000000298, -30.4731503129), (55.939339858, -30.0338104847), (55.5000000298, -28.9731503129))
            Line((55.5, -28.9731503129), (55.5, -45))
        make_face()
        Polygon((56.5, 28.1081823957), (56.5, 23.8318176043), (60.6, 20.97), (64.7, 23.8318176043), (64.7, 28.1081823957), (60.6, 30.97), align=None)
        with Locations((60.6, 25.9731523439)):
            Circle(F0_R, mode=Mode.SUBTRACT)
        with Locations((60.6, 25.9731523439)):
            Circle(F0_R)
    extrude(amount=-F3_DEPTH, mode=Mode.SUBTRACT)

    # F0 (on Top) → F4 (cut)
    with BuildSketch(Plane.XY.offset(F4_START)):
        with BuildLine():
            Line((55.5, 44.499418828), (55.5, 41))
            Line((55.5, 41), (55.5, 29))
            Line((55.5, 29), (55.5, 27.4731523439))
            Line((55.5, 27.4731523439), (55.5, 18.9731523439))
            Line((55.5, 18.9731523439), (57, 18.9731523439))
            Line((57, 18.9731523439), (64, 18.9731523439))
            Line((64, 18.9731523439), (65.5, 18.9731523439))
            Line((65.5, 18.9731523439), (65.5, 27.4731523439))
            Line((65.5, 27.4731523439), (65.3682845321, 44.5110146078))
            ThreePointArc((65.3682845321, 44.5110146078), (64.9248818439, 45.5641708343), (63.8683293534, 45.999418828))
            Line((63.8683293534, 45.999418828), (57, 45.999418828))
            ThreePointArc((57, 45.999418828), (55.9393398282, 45.5600789998), (55.5, 44.499418828))
        make_face()
        Polygon((60.6, 20.97), (56.5, 23.8318176043), (56.5, 28.1081823957), (60.6, 30.97), (64.7, 28.1081823957), (64.7, 23.8318176043), align=None, mode=Mode.SUBTRACT)
        with BuildLine():
            Line((65.5, 18.9731523439), (64, 18.9731523439))
            ThreePointArc((64, 18.9731523439), (65.0606601718, 18.5338125156), (65.5, 17.4731523439))
            Line((65.5, 17.4731523439), (65.5, 18.9731523439))
        make_face()
        with BuildLine():
            Line((57, 18.9731523439), (55.5, 18.9731523439))
            Line((55.5, 18.9731523439), (55.5, 17.4731523439))
            ThreePointArc((55.5, 17.4731523439), (55.9393398282, 18.5338125156), (57, 18.9731523439))
        make_face()
        with BuildLine():
            Line((64, 18.9731523439), (57, 18.9731523439))
            ThreePointArc((57, 18.9731523439), (55.9393398282, 18.5338125156), (55.5, 17.4731523439))
            Line((55.5, 17.4731523439), (55.5, 16.9731523439))
            Line((55.5, 16.9731523439), (57, 16.9731523439))
            Line((57, 16.9731523439), (64, 16.9731523439))
            Line((64, 16.9731523439), (65.5, 16.9731523439))
            Line((65.5, 16.9731523439), (65.5, 17.4731523439))
            ThreePointArc((65.5, 17.4731523439), (65.0606601718, 18.5338125156), (64, 18.9731523439))
        make_face()
        with BuildLine():
            Line((57, 6.9731523439), (55.5, 6.9731523439))
            Line((55.5, 6.9731523439), (55.5, 6.4731523439))
            ThreePointArc((55.5, 6.4731523439), (55.9393398282, 5.4124921721), (57, 4.9731523439))
            Line((57, 4.9731523439), (64, 4.9731523439))
            ThreePointArc((64, 4.9731523439), (65.0606601718, 5.4124921721), (65.5, 6.4731523439))
            Line((65.5, 6.4731523439), (65.5, 6.9731523439))
            Line((65.5, 6.9731523439), (64, 6.9731523439))
            Line((64, 6.9731523439), (57, 6.9731523439))
        make_face()
        with BuildLine():
            Line((55.5, -6.4731523439), (55.5, -8.4731523439))
            ThreePointArc((55.5, -8.4731523439), (55.9393398282, -7.4124921721), (57, -6.9731523439))
            Line((57, -6.9731523439), (64, -6.9731523439))
            ThreePointArc((64, -6.9731523439), (65.0606601718, -7.4124921721), (65.5, -8.4731523439))
            Line((65.5, -8.4731523439), (65.5, -6.4731523439))
            ThreePointArc((65.5, -6.4731523439), (65.0606601718, -5.4124921721), (64, -4.9731523439))
            Line((64, -4.9731523439), (57, -4.9731523439))
            ThreePointArc((57, -4.9731523439), (55.9393398282, -5.4124921721), (55.5, -6.4731523439))
        make_face()
        with BuildLine():
            Line((55.5, -15.4731523439), (55.5, -17.4731523439))
            ThreePointArc((55.5, -17.4731523439), (55.9393398282, -18.5338125156), (57, -18.9731523439))
            Line((57, -18.9731523439), (64, -18.9731523439))
            ThreePointArc((64, -18.9731523439), (65.0606601718, -18.5338125156), (65.5, -17.4731523439))
            Line((65.5, -17.4731523439), (65.5, -15.4731523439))
            ThreePointArc((65.5, -15.4731523439), (65.0606601718, -16.5338125156), (64, -16.9731523439))
            Line((64, -16.9731523439), (57, -16.9731523439))
            ThreePointArc((57, -16.9731523439), (55.9393398282, -16.5338125156), (55.5, -15.4731523439))
        make_face()
        with BuildLine():
            Line((55.5, -27.4731523439), (55.5, -28.9731503129))
            ThreePointArc((55.5000000298, -28.9731503129), (55.939339858, -30.0338104847), (57.0000000298, -30.4731503129))
            Line((57.0000000298, -30.4731503129), (64.0000000298, -30.4731503129))
            ThreePointArc((64.0000000298, -30.4731503129), (64.9881759296, -30.1016486032), (65.4868731143, -29.171161501))
            Line((65.4868731143, -29.171161501), (65.5, -27.4731523439))
            Line((65.5, -27.4731523439), (65.5, -17.4731523439))
            ThreePointArc((65.5, -17.4731523439), (65.0606601718, -18.5338125156), (64, -18.9731523439))
            Line((64, -18.9731523439), (57, -18.9731523439))
            ThreePointArc((57, -18.9731523439), (55.9393398282, -18.5338125156), (55.5, -17.4731523439))
            Line((55.5, -17.4731523439), (55.5, -27.4731523439))
        make_face()
        Polygon((60.6000007153, -29.9631433734), (56.5000007153, -27.1013257692), (56.5000007153, -22.8249609777), (60.6000007153, -19.9631433734), (64.7000007153, -22.8249609777), (64.7000007153, -27.1013257692), align=None, mode=Mode.SUBTRACT)
        Polygon((52.5, -50), (52.5, -64.151630939), (55.5, -64.151630939), (55.5, -58.4731504917), (55.5, -51.4731504917), (55.5, -50), align=None)
        Polygon((47.5, -50), (47.5, -65), (52.5, -65), (52.5, -64.151630939), (52.5, -50), align=None)
        with Locations((54, 35)):
            Rectangle(F0_W_2, F0_H_2)
        with Locations((50, 35)):
            Rectangle(F0_W, F0_H_2)
        with BuildLine():
            Line((55.5, -58.4731504917), (55.5, -64.151630939))
            Line((55.5, -64.151630939), (63.8645118363, -64.151630939))
            ThreePointArc((63.8645118363, -64.151630939), (64.9251720081, -63.7122911108), (65.3645118363, -62.651630939))
            Line((65.3645118363, -62.651630939), (65.3645118363, -58.4731504917))
            Line((65.3645118363, -58.4731504917), (65.3645118363, -51.4731504917))
            ThreePointArc((65.3645118363, -51.4731504917), (64.9251720081, -50.4124903199), (63.8645118363, -49.9731504917))
            Line((63.8645118363, -49.9731504917), (57, -49.9731504917))
            Line((57, -49.9731504917), (55.5, -50))
            Line((55.5, -50), (55.5, -51.4731504917))
            Line((55.5, -51.4731504917), (55.5, -58.4731504917))
        make_face()
        Polygon((60.4814975321, -60.5032157659), (56.3814975321, -57.6413981616), (56.3814975321, -53.3650333702), (60.4814975321, -50.5032157659), (64.5814975321, -53.3650333702), (64.5814975321, -57.6413981616), align=None, mode=Mode.SUBTRACT)
    extrude(amount=-F4_DEPTH, mode=Mode.SUBTRACT)

    # F0 (on Top) → F5 (join)
    with BuildSketch(Plane.XY):
        Polygon((-82.5, 65), (-82.5, -65), (47.5, -65), (47.5, -50), (47.5, -0.9090909091), (47.5, 0.9090909091), (47.5, 29), (47.5, 41), (47.5, 65), align=None)
    extrude(amount=-F5_DEPTH)

    # F0 (on Top) → F6 (join)
    with BuildSketch(Plane.XY):
        Polygon((-87.5, 5), (-87.5, 40), (-94.5, 40), (-94.5, -40), (-87.5, -40), (-87.5, -5), align=None)
    extrude(amount=-F6_DEPTH)


solid = f1.part
